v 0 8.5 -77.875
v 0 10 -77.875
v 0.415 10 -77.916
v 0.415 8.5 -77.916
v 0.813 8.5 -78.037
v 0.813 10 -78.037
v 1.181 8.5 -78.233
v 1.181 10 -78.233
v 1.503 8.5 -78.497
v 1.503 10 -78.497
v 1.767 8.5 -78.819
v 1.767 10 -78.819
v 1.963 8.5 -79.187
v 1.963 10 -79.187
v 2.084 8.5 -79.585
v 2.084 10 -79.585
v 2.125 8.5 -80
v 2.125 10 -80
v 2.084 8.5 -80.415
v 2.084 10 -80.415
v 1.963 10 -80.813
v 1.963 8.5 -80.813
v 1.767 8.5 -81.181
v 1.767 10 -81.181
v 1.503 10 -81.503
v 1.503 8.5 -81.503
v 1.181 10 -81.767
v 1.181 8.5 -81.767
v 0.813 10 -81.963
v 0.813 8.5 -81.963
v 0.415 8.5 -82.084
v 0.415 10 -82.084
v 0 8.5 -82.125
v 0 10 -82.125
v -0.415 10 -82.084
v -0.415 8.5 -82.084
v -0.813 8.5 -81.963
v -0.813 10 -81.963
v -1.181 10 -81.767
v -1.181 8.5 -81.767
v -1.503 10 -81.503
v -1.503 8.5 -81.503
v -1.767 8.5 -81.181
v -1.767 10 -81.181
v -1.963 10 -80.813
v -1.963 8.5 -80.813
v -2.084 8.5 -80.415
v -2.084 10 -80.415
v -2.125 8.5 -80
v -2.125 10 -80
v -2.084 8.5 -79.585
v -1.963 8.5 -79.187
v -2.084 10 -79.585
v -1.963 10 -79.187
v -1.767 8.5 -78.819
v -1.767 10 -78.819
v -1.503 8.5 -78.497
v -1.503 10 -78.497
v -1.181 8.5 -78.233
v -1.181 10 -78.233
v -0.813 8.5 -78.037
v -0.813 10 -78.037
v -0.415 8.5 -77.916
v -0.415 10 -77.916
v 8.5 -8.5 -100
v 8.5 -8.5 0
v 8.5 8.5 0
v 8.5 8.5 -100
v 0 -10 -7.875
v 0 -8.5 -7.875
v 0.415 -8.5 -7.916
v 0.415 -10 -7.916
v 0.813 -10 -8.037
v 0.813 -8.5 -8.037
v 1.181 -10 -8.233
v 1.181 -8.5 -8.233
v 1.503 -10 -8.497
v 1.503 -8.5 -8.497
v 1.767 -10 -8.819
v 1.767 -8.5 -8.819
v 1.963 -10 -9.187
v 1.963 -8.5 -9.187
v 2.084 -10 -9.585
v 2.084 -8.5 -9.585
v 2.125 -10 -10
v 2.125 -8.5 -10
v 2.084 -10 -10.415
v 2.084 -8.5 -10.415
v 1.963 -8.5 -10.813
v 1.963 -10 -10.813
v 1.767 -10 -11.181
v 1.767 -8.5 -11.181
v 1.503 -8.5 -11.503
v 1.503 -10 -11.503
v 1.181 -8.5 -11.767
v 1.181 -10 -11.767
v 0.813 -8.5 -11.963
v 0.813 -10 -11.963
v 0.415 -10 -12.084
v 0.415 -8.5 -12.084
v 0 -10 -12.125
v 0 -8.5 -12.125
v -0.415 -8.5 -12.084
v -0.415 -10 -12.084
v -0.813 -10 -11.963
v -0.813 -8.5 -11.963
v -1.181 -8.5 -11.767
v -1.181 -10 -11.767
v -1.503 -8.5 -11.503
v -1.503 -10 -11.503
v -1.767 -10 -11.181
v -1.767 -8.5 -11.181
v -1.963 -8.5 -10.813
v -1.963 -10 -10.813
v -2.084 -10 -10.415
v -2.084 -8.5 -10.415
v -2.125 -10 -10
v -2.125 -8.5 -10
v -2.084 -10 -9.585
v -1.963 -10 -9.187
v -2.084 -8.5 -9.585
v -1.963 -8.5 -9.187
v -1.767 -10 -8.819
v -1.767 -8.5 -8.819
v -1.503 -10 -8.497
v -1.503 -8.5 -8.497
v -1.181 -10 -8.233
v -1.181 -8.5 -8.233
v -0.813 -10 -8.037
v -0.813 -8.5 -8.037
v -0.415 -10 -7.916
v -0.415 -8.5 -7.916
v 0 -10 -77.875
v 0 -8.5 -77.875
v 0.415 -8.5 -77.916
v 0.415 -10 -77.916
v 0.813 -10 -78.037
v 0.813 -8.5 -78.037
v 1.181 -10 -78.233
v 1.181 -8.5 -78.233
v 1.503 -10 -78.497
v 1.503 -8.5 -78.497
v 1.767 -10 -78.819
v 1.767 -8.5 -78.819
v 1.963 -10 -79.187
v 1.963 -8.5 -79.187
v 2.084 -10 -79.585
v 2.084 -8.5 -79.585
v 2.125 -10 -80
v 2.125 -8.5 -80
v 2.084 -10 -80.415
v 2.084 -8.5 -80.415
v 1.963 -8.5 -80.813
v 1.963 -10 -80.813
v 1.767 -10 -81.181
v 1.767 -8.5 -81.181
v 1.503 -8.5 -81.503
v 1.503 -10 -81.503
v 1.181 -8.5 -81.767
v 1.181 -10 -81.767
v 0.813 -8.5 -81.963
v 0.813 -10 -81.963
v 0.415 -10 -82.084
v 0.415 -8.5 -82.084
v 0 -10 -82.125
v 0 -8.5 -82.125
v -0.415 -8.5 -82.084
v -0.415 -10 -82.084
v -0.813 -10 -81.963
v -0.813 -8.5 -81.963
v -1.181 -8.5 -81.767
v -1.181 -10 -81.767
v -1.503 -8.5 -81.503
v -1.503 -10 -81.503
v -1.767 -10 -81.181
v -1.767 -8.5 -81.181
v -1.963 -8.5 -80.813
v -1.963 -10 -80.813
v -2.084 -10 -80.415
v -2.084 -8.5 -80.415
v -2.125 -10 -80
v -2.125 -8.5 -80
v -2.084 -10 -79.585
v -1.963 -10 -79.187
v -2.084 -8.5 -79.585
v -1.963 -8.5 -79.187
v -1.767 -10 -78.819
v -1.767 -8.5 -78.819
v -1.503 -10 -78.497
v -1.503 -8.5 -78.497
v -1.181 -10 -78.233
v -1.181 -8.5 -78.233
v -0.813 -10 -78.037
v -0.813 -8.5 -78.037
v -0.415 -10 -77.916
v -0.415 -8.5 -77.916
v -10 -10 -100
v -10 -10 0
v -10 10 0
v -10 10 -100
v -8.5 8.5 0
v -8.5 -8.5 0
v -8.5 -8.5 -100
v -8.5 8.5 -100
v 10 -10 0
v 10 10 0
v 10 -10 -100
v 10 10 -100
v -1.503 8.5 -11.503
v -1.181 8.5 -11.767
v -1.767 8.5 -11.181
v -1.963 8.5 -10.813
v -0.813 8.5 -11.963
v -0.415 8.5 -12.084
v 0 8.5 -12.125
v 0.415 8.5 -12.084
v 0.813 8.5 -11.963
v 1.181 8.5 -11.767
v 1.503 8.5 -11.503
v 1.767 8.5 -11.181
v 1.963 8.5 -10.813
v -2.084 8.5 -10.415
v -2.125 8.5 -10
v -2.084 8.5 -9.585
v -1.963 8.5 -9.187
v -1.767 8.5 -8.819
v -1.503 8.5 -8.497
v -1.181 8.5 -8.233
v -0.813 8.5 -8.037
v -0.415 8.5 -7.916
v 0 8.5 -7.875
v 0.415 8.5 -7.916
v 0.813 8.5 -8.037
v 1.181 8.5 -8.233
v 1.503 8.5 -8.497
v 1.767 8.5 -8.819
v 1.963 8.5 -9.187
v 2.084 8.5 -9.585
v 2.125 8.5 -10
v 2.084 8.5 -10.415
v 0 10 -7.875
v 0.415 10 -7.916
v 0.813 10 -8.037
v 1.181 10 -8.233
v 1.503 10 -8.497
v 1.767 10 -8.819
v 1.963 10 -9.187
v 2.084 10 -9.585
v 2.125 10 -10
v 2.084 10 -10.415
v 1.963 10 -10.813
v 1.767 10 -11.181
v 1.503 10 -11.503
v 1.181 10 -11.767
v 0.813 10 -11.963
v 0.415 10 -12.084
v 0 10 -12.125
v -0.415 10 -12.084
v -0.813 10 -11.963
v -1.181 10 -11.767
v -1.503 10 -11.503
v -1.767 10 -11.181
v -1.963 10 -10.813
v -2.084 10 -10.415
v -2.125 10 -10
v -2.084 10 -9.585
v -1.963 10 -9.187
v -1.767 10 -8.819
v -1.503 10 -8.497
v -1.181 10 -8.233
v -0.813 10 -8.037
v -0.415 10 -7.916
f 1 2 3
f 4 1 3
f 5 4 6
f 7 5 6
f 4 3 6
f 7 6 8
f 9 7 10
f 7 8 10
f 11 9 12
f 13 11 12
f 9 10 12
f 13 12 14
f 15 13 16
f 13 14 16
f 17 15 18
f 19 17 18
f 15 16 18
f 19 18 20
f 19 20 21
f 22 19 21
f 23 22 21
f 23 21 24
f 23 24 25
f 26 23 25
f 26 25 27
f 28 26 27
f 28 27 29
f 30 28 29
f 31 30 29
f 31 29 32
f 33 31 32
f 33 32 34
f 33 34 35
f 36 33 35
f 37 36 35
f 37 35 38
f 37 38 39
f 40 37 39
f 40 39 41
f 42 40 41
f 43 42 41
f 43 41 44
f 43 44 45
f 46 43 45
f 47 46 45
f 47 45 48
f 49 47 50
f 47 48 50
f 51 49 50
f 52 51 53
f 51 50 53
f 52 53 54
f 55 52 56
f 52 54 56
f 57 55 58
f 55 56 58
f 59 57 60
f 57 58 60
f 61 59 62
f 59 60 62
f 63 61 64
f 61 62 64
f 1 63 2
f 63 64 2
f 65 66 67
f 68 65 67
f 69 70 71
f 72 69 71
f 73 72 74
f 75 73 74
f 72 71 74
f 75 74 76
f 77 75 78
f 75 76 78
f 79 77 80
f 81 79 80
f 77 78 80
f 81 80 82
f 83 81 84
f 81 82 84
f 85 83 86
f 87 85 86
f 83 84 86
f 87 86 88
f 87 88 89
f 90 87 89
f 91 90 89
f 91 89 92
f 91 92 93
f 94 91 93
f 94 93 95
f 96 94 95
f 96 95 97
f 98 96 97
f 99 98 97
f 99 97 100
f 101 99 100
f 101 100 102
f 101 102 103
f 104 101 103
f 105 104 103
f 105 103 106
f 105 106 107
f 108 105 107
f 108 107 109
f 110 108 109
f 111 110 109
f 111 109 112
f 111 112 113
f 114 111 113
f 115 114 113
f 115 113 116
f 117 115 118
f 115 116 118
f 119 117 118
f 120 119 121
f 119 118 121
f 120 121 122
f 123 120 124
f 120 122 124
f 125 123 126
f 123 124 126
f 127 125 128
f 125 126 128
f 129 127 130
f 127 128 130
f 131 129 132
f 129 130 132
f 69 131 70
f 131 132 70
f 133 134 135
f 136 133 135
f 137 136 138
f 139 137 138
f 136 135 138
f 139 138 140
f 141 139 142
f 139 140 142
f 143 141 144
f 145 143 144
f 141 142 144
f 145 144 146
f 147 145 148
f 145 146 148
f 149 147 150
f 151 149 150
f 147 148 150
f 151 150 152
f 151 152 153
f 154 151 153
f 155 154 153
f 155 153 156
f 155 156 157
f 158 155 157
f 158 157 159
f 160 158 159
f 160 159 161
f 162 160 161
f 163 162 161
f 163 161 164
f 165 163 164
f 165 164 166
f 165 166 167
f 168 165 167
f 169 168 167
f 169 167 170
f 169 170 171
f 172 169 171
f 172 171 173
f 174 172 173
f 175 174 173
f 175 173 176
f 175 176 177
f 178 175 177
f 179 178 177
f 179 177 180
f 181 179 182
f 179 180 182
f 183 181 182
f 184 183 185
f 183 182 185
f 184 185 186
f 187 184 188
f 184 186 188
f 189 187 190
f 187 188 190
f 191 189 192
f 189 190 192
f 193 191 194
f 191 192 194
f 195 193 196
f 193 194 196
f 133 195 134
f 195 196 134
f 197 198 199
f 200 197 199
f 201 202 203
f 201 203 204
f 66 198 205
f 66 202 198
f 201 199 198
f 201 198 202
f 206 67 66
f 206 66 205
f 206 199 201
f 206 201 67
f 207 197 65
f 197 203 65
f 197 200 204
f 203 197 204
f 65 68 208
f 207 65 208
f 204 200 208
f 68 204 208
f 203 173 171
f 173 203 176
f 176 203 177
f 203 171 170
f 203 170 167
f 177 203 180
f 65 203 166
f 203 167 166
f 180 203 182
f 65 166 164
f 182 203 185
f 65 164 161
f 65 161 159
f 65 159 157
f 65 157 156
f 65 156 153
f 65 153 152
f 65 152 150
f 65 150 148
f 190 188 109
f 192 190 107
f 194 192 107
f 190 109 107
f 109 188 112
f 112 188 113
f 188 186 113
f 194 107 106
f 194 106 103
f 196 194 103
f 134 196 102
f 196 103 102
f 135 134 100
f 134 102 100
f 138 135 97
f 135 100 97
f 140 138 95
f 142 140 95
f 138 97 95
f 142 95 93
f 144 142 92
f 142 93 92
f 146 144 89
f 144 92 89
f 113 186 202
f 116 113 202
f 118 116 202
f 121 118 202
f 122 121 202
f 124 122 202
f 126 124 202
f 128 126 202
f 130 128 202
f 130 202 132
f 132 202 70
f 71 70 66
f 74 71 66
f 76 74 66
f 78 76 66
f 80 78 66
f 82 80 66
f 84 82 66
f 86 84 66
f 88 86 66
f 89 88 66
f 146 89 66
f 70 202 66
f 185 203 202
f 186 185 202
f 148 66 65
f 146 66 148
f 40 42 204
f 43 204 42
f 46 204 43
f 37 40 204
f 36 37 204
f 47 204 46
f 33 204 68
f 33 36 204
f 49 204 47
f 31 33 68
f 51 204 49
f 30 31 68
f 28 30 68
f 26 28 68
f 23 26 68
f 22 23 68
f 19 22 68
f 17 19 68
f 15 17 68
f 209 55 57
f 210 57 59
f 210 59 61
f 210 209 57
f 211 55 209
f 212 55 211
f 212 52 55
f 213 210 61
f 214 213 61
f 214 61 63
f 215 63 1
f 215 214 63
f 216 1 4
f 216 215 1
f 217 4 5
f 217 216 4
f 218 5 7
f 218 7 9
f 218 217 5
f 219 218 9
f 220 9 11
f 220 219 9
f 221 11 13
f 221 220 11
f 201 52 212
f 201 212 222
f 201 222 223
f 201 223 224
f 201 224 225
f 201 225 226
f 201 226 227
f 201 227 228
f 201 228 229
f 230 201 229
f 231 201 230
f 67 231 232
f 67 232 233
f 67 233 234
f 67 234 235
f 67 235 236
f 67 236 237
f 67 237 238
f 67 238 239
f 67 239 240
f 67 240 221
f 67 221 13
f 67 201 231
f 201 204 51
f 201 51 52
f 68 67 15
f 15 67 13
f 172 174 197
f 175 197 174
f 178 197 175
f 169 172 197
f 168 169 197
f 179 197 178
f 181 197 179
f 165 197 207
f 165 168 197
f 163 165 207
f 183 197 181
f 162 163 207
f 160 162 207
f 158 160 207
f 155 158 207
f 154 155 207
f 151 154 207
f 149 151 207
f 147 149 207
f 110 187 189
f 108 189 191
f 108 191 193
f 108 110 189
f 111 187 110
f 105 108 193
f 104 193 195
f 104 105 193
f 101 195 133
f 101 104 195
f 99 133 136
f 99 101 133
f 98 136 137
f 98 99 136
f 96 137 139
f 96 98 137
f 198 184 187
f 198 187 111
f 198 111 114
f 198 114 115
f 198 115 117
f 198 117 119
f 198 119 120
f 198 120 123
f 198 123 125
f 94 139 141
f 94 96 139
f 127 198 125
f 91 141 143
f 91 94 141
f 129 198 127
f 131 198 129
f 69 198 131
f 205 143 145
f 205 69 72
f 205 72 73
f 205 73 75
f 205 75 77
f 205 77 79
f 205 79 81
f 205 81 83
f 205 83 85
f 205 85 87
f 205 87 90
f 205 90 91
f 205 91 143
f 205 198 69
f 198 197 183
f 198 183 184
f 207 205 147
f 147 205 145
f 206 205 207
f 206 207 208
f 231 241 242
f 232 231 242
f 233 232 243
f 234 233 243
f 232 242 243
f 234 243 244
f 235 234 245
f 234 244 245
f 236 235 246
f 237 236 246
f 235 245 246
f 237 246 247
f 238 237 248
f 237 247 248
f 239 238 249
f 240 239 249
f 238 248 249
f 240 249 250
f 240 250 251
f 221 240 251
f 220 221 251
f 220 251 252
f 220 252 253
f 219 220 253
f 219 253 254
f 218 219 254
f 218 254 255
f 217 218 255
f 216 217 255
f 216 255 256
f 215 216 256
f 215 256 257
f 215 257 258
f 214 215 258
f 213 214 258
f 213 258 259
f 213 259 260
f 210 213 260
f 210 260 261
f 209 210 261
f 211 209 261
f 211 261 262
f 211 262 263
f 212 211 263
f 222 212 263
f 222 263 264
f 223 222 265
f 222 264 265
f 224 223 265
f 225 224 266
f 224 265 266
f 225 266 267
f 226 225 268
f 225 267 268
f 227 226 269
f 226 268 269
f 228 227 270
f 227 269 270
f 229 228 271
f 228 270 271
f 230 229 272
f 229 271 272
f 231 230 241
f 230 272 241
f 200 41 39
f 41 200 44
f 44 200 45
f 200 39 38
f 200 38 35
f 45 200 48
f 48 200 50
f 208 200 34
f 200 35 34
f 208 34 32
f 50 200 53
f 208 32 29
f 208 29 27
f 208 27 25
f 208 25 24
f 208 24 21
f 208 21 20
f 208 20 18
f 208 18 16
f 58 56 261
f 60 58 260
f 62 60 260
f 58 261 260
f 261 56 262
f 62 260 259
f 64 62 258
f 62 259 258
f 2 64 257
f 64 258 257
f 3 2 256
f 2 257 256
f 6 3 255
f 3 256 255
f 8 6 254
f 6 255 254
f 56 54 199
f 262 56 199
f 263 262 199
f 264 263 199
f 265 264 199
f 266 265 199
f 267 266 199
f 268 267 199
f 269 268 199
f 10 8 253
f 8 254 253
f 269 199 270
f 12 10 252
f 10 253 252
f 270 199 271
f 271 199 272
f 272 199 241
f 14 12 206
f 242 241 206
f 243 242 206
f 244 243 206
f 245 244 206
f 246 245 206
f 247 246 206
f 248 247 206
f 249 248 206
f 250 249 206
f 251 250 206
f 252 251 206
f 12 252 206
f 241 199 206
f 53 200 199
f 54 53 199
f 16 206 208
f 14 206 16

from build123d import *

# Parameters (mm, degrees)
SKETCH1_W           = 20
SKETCH1_H           = 20
SKETCH1_W_2         = 17
SKETCH1_H_2         = 17
BOSS_EXTRUDE1_DEPTH = 100
SKETCH2_R           = 2.125
CUT_EXTRUDE1_DEPTH  = 103.46950766


with BuildPart() as part:
    # Sketch1 → Boss-Extrude1 (new body)
    with BuildSketch(Plane.XY):
        Rectangle(SKETCH1_W, SKETCH1_H)
        Rectangle(SKETCH1_W_2, SKETCH1_H_2, mode=Mode.SUBTRACT)
    extrude(amount=-BOSS_EXTRUDE1_DEPTH)

    # Sketch2 → Cut-Extrude1 (cut, through all)
    with BuildSketch(Plane(origin=(0, 10, 0), x_dir=(1, 0, 0), z_dir=(0, 1, 0))):
        with Locations(Location((0, 10, 0), (0, 0, 270))):
            Circle(SKETCH2_R)
        with Locations(Location((0, 80, 0), (0, 0, 270))):
            Circle(SKETCH2_R)
        with Locations((0, 150)):
            Circle(SKETCH2_R)
    extrude(amount=-CUT_EXTRUDE1_DEPTH, mode=Mode.SUBTRACT)


solid = part.part
